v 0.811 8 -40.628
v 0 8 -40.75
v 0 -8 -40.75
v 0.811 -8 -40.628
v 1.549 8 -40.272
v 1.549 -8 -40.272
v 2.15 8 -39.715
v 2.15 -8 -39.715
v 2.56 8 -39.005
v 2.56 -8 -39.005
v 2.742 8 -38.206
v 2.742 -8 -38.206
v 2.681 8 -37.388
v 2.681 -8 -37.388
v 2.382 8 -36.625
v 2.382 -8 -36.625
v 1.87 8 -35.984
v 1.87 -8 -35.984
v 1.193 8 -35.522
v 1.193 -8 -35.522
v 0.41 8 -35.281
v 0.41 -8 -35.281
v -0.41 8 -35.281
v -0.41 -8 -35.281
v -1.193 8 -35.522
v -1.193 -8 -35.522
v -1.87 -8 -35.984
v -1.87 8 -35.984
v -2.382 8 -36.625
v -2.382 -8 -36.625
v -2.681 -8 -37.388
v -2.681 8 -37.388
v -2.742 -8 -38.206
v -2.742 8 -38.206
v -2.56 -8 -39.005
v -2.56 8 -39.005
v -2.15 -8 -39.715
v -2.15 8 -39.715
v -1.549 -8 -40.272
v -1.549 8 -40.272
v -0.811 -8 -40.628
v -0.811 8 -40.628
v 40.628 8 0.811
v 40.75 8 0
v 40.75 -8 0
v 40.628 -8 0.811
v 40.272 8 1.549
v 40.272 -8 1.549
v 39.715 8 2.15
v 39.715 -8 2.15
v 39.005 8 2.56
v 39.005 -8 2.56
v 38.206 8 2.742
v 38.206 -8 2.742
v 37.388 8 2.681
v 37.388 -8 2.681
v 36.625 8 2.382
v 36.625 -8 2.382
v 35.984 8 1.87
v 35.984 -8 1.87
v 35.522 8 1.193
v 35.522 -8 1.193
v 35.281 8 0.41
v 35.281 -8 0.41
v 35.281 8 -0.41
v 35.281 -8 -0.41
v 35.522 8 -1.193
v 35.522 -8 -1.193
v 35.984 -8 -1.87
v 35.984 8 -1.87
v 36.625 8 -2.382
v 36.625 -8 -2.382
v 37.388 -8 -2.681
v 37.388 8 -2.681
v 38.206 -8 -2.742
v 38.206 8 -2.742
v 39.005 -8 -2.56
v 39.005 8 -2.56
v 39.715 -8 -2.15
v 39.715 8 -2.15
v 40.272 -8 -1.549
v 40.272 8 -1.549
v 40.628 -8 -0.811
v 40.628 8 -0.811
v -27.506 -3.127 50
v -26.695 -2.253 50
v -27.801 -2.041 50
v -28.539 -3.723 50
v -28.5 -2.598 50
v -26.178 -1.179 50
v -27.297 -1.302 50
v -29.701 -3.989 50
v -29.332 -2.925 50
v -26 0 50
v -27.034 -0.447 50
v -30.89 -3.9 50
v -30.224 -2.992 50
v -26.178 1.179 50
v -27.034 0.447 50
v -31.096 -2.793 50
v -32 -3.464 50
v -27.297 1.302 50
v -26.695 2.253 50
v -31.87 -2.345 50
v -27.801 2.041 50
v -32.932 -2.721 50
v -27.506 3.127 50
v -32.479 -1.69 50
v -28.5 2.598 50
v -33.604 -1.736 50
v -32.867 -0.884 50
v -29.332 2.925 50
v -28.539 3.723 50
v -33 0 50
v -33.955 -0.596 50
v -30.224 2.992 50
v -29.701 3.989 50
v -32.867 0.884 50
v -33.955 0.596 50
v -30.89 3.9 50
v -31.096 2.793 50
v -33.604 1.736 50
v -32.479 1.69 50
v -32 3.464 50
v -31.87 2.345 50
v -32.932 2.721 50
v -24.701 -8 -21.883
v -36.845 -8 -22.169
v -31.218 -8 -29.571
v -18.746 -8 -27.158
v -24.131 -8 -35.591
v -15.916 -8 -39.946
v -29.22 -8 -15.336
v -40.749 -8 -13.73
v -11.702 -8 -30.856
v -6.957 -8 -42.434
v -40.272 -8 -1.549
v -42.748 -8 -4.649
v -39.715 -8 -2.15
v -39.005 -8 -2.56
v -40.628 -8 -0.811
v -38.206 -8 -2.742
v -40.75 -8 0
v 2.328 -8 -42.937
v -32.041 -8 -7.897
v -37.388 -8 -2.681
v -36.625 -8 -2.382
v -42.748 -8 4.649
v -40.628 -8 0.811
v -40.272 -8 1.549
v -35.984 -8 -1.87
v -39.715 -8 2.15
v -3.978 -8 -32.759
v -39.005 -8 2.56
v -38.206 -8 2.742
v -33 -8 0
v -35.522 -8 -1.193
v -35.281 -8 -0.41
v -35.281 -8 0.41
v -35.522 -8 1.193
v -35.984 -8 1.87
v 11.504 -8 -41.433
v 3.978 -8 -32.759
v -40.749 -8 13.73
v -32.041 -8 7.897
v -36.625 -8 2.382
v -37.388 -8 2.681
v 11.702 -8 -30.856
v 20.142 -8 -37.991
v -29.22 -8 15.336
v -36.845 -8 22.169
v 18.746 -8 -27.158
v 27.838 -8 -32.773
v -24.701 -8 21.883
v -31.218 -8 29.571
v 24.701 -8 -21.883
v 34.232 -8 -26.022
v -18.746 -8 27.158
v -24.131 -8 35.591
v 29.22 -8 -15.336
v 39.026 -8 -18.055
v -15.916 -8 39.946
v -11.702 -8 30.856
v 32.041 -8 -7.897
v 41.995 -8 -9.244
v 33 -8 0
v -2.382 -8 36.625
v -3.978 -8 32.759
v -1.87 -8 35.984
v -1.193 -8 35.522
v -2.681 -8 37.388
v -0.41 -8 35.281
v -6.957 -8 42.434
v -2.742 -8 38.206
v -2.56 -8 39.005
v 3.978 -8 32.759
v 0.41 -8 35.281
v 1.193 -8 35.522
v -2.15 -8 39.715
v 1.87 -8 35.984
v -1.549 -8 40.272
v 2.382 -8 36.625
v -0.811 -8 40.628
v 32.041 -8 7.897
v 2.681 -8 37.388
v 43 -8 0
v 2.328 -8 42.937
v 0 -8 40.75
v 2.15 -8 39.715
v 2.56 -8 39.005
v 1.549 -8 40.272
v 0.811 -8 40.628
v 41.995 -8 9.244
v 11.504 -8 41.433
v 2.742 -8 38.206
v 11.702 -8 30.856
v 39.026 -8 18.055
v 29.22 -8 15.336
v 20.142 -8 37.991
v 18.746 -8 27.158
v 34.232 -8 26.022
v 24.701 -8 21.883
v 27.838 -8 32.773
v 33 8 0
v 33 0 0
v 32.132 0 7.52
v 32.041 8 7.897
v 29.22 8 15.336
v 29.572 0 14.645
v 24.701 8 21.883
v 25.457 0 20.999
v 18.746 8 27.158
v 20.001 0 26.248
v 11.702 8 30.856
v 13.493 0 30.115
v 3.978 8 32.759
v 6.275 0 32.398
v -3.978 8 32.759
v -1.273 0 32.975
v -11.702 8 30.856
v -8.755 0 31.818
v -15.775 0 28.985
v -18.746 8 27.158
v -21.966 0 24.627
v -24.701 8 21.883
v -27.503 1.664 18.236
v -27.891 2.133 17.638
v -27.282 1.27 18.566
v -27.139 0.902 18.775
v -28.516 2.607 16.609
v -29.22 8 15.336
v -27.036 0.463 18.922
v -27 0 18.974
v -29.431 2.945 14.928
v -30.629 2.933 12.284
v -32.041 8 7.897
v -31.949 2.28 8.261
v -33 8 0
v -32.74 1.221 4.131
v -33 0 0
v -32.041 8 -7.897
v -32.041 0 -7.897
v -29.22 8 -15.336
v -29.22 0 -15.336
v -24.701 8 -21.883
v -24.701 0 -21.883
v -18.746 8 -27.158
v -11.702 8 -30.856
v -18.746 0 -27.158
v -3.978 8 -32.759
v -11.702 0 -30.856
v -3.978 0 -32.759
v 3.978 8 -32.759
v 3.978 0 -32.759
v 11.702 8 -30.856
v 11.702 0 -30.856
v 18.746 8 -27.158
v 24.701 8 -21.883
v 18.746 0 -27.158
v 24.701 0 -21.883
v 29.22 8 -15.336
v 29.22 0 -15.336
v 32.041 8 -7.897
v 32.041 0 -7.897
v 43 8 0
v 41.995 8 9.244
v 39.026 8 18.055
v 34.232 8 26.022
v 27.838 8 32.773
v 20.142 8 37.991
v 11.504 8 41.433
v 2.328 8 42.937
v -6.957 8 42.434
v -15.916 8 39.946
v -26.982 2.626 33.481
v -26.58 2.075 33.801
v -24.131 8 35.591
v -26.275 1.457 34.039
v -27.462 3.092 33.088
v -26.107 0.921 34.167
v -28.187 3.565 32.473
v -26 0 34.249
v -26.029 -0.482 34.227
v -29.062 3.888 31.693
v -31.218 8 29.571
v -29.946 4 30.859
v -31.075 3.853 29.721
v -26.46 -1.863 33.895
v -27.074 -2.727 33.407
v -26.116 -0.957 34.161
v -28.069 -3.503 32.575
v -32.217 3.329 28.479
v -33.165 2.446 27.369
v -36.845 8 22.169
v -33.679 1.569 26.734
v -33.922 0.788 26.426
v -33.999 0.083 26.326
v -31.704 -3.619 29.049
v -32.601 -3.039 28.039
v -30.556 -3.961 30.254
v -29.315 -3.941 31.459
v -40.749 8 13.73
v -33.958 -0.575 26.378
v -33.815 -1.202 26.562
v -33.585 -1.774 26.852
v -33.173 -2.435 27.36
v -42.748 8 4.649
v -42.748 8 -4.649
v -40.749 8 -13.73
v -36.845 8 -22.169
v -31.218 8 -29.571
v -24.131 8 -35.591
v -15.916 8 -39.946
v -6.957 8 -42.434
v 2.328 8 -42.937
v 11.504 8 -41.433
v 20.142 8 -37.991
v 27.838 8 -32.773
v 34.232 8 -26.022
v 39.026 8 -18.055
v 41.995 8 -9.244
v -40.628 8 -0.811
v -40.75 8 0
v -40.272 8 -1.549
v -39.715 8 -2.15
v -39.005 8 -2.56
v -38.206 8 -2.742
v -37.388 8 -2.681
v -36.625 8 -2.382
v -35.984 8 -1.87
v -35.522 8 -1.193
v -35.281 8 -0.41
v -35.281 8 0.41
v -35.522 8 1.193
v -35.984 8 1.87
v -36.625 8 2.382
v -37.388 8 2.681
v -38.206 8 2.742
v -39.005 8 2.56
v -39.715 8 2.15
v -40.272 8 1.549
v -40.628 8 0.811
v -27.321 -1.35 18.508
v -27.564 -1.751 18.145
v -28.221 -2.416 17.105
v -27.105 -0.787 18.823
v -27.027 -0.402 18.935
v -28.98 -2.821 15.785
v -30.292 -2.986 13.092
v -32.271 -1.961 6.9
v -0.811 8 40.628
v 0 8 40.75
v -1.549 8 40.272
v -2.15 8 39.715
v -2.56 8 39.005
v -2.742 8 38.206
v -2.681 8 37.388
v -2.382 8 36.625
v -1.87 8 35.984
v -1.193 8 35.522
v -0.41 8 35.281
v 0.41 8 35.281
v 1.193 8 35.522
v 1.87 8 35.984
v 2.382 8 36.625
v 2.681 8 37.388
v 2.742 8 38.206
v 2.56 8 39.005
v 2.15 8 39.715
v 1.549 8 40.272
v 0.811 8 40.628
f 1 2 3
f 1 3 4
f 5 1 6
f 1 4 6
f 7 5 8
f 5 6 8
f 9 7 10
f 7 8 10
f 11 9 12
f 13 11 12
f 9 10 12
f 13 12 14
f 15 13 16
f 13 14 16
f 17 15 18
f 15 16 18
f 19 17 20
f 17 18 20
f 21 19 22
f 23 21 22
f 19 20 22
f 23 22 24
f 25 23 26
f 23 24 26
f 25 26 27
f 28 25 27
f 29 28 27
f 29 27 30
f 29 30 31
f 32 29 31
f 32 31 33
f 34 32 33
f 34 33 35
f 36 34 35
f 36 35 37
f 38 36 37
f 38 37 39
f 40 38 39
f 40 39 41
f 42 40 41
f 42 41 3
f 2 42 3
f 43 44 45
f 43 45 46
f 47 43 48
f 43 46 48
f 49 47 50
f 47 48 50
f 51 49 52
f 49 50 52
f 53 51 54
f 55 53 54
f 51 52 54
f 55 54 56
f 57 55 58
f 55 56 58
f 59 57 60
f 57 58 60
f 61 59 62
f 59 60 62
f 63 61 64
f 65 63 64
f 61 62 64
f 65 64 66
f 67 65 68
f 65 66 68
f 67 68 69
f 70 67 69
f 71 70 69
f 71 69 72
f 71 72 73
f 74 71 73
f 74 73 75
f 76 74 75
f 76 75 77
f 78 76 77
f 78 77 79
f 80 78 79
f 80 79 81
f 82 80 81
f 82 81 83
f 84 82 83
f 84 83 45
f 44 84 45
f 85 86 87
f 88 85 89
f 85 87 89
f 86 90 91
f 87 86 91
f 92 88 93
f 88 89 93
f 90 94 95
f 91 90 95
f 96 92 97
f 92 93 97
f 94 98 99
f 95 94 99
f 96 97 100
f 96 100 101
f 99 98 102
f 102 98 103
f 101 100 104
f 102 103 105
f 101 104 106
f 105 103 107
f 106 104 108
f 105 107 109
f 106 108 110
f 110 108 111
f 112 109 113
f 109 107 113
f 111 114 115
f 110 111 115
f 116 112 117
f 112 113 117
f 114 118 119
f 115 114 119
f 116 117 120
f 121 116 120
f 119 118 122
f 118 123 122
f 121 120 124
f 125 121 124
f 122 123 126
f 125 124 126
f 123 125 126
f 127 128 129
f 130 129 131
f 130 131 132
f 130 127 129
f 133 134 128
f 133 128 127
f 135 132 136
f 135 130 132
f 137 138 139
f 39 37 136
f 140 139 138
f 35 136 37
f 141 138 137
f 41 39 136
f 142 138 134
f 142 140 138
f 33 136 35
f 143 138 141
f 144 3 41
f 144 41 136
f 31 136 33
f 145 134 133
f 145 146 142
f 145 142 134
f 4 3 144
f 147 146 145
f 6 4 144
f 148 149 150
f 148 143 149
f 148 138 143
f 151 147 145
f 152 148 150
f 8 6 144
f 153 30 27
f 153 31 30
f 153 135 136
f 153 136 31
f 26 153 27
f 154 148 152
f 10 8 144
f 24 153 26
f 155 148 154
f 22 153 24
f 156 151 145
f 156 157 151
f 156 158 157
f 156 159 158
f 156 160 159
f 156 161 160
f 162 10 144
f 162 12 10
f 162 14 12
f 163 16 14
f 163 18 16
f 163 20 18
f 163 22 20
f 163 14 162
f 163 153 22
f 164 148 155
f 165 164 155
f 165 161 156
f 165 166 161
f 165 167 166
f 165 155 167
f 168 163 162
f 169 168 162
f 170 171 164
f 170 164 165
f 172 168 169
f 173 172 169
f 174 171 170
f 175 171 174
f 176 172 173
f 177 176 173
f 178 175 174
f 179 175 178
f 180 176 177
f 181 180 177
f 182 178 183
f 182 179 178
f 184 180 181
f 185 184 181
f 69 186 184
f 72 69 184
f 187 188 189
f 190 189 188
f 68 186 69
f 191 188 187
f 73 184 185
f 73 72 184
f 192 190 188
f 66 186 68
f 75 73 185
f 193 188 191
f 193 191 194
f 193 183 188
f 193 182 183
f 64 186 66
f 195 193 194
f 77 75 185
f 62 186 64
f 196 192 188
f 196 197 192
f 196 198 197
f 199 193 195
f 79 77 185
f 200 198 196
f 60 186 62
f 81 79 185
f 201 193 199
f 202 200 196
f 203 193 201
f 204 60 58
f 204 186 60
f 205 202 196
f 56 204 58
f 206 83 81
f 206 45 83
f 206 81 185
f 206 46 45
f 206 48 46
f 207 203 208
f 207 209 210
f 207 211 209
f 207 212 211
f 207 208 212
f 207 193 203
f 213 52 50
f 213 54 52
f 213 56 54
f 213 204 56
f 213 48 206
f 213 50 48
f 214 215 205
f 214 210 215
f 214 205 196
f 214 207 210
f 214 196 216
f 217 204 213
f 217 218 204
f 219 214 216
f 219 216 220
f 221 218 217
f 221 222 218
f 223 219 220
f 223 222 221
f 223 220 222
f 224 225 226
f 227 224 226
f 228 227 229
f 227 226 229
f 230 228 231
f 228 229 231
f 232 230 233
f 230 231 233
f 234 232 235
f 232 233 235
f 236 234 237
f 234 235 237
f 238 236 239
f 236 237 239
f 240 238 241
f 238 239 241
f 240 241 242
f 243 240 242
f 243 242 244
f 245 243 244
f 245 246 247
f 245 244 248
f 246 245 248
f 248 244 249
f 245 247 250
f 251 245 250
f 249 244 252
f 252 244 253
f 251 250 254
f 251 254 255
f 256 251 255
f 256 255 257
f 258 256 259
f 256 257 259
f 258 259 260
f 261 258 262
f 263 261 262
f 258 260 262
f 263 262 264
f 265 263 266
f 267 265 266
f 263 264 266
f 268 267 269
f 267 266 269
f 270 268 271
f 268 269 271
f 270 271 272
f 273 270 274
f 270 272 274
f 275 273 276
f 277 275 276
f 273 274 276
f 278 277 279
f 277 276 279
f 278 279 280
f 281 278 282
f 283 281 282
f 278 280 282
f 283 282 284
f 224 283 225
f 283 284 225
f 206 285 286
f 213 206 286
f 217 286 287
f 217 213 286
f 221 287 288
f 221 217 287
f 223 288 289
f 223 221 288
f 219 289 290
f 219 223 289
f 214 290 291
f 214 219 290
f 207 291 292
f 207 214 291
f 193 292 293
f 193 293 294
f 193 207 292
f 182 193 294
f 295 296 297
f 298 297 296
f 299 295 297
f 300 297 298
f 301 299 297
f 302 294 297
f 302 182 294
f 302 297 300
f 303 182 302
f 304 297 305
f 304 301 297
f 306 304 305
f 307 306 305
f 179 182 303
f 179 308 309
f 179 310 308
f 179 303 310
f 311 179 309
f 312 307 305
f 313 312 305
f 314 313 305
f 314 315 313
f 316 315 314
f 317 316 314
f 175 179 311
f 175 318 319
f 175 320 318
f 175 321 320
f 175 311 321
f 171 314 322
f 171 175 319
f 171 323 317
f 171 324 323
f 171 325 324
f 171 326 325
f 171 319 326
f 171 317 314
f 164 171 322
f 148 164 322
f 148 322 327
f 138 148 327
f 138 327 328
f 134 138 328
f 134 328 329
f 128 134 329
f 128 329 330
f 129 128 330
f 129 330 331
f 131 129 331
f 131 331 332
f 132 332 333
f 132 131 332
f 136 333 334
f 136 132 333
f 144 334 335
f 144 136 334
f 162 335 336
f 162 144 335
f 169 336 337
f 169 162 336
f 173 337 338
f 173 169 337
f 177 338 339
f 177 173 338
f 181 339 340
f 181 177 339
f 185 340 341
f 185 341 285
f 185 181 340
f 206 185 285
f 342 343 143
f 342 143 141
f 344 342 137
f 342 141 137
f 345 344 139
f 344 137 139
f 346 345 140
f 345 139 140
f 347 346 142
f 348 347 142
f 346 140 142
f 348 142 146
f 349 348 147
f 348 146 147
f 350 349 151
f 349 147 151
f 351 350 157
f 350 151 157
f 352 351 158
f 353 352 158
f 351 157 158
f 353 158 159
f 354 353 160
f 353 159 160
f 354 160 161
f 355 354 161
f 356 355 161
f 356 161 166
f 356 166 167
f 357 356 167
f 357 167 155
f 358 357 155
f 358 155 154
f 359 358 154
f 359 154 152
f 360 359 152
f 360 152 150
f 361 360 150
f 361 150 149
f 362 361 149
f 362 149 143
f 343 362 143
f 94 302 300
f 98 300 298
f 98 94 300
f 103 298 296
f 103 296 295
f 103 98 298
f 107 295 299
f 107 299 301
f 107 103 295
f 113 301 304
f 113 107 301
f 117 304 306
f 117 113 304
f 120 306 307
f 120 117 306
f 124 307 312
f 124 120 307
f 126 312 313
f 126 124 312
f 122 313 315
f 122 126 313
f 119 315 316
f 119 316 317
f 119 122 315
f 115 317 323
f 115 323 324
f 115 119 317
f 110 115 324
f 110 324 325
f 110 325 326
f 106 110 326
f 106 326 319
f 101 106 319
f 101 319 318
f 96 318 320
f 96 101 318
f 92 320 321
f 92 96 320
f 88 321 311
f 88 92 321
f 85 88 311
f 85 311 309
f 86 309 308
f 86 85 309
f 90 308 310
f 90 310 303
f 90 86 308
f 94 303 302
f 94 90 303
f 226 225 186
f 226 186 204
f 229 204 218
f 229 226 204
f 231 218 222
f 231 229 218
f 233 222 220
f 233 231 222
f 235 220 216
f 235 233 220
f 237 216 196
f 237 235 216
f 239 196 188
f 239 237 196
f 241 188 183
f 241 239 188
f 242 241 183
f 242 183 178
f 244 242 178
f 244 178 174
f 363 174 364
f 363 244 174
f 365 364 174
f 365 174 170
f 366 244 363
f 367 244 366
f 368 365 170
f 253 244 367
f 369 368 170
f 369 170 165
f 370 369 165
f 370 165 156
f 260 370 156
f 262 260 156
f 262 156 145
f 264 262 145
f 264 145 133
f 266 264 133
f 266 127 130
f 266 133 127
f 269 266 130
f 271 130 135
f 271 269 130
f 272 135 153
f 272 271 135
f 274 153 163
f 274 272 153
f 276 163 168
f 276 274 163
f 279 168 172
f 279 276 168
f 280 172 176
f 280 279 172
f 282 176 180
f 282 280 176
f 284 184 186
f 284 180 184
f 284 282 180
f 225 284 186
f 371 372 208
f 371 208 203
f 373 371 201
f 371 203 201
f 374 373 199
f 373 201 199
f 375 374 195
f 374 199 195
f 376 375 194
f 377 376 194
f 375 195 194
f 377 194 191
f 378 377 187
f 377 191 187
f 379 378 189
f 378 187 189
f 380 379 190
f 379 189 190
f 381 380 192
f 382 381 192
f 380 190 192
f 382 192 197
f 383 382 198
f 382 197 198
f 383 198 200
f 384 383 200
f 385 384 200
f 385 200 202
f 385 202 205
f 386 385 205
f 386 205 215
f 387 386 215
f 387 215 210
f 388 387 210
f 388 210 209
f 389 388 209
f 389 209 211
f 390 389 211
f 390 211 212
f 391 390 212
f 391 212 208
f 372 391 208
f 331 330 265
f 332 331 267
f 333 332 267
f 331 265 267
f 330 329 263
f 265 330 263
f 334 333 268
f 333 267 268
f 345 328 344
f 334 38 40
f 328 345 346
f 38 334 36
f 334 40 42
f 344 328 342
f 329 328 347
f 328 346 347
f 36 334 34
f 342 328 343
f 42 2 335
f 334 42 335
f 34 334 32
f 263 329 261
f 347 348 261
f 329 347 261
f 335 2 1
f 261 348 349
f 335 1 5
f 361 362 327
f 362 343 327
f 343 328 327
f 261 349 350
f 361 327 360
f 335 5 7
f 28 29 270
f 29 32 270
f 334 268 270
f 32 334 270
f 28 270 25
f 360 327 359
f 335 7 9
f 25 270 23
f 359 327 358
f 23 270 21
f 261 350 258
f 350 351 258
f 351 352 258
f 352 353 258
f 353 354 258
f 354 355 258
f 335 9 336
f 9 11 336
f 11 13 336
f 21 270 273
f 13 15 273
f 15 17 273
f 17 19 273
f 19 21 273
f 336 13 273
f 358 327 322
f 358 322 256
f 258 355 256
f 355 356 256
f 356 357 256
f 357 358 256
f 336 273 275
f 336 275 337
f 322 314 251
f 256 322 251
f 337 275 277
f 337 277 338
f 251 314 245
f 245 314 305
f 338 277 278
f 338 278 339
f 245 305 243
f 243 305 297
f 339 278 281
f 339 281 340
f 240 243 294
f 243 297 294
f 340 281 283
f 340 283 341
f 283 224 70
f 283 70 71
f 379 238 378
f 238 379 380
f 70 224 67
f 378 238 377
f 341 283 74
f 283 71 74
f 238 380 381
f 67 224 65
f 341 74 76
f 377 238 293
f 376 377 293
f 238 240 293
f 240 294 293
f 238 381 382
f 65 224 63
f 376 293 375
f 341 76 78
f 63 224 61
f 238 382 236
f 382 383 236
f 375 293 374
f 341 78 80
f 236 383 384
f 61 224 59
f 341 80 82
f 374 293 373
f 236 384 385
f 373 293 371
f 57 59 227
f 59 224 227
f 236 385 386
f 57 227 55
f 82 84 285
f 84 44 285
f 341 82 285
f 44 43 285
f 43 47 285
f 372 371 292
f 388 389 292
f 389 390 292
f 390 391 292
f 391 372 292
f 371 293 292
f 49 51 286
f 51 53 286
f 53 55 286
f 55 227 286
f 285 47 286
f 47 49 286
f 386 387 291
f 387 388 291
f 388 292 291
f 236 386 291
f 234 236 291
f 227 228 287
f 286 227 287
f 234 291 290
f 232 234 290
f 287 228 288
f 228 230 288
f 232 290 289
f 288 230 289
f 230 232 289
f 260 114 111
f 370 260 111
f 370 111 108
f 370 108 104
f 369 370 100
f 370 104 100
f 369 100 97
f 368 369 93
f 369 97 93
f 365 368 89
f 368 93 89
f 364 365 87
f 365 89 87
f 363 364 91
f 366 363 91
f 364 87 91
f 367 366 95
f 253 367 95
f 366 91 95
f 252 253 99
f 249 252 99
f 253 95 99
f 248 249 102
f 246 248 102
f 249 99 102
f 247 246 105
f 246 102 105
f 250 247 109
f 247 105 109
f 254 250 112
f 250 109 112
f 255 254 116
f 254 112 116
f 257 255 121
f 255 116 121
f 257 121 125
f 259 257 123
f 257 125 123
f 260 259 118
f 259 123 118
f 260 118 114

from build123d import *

# Parameters (mm, degrees)
SKETCH001_R           = 43
PAD_DEPTH             = 8
SKETCH002_W           = 4
SKETCH002_H           = 50
SKETCH003_R           = 33
POCKET_DEPTH          = 8.001
POCKET_DEPTH_BACK     = 8.001
SKETCH004_W           = 3
SKETCH004_H           = 50
SKETCH013_R           = 2.75
POCKET005_DEPTH       = 271.35174
POLARPATTERN003_COUNT = 4


with BuildPart() as part:
    # Sketch001 → Pad (new body, symmetric)
    with BuildSketch(Plane.XZ):
        Circle(SKETCH001_R)
    extrude(amount=PAD_DEPTH, both=True)

    # Sketch002 → Revolution (revolve)
    with BuildSketch(Plane.XZ):
        with Locations((-28, 25)):
            Rectangle(SKETCH002_W, SKETCH002_H)
    revolve(axis=Axis((-30, 0, 40.402922), (0, 0, 1)))

    # Sketch003 → Pocket (cut, two sides)
    with BuildSketch(Plane.XZ) as pocket_sk:
        Circle(SKETCH003_R)
    extrude(amount=-POCKET_DEPTH, mode=Mode.SUBTRACT)
    extrude(pocket_sk.sketch, amount=POCKET_DEPTH_BACK, mode=Mode.SUBTRACT)

    # Sketch004 → Groove (revolve, cut)
    with BuildSketch(Plane.XZ):
        with Locations((-31.5, 25)):
            Rectangle(SKETCH004_W, SKETCH004_H)
    revolve(axis=Axis((-30, 0, 22.276785), (0, 0, 1)), mode=Mode.SUBTRACT)

    # Sketch013 (on Face4 of Groove) → Pocket005 (cut, through all)
    with BuildSketch(Plane.XZ.offset(8)):
        with Locations((38, 0)):
            Circle(SKETCH013_R)
    pocket005 = extrude(amount=-POCKET005_DEPTH, mode=Mode.SUBTRACT)

    # PolarPattern003: Pocket005 ×4 about axis
    polarpattern003_axis = Axis((0, -8, 0), (0, -1, 0))
    for i in range(1, POLARPATTERN003_COUNT):
        add(pocket005.rotate(polarpattern003_axis, i * 360 / POLARPATTERN003_COUNT), mode=Mode.SUBTRACT)


solid = part.part
